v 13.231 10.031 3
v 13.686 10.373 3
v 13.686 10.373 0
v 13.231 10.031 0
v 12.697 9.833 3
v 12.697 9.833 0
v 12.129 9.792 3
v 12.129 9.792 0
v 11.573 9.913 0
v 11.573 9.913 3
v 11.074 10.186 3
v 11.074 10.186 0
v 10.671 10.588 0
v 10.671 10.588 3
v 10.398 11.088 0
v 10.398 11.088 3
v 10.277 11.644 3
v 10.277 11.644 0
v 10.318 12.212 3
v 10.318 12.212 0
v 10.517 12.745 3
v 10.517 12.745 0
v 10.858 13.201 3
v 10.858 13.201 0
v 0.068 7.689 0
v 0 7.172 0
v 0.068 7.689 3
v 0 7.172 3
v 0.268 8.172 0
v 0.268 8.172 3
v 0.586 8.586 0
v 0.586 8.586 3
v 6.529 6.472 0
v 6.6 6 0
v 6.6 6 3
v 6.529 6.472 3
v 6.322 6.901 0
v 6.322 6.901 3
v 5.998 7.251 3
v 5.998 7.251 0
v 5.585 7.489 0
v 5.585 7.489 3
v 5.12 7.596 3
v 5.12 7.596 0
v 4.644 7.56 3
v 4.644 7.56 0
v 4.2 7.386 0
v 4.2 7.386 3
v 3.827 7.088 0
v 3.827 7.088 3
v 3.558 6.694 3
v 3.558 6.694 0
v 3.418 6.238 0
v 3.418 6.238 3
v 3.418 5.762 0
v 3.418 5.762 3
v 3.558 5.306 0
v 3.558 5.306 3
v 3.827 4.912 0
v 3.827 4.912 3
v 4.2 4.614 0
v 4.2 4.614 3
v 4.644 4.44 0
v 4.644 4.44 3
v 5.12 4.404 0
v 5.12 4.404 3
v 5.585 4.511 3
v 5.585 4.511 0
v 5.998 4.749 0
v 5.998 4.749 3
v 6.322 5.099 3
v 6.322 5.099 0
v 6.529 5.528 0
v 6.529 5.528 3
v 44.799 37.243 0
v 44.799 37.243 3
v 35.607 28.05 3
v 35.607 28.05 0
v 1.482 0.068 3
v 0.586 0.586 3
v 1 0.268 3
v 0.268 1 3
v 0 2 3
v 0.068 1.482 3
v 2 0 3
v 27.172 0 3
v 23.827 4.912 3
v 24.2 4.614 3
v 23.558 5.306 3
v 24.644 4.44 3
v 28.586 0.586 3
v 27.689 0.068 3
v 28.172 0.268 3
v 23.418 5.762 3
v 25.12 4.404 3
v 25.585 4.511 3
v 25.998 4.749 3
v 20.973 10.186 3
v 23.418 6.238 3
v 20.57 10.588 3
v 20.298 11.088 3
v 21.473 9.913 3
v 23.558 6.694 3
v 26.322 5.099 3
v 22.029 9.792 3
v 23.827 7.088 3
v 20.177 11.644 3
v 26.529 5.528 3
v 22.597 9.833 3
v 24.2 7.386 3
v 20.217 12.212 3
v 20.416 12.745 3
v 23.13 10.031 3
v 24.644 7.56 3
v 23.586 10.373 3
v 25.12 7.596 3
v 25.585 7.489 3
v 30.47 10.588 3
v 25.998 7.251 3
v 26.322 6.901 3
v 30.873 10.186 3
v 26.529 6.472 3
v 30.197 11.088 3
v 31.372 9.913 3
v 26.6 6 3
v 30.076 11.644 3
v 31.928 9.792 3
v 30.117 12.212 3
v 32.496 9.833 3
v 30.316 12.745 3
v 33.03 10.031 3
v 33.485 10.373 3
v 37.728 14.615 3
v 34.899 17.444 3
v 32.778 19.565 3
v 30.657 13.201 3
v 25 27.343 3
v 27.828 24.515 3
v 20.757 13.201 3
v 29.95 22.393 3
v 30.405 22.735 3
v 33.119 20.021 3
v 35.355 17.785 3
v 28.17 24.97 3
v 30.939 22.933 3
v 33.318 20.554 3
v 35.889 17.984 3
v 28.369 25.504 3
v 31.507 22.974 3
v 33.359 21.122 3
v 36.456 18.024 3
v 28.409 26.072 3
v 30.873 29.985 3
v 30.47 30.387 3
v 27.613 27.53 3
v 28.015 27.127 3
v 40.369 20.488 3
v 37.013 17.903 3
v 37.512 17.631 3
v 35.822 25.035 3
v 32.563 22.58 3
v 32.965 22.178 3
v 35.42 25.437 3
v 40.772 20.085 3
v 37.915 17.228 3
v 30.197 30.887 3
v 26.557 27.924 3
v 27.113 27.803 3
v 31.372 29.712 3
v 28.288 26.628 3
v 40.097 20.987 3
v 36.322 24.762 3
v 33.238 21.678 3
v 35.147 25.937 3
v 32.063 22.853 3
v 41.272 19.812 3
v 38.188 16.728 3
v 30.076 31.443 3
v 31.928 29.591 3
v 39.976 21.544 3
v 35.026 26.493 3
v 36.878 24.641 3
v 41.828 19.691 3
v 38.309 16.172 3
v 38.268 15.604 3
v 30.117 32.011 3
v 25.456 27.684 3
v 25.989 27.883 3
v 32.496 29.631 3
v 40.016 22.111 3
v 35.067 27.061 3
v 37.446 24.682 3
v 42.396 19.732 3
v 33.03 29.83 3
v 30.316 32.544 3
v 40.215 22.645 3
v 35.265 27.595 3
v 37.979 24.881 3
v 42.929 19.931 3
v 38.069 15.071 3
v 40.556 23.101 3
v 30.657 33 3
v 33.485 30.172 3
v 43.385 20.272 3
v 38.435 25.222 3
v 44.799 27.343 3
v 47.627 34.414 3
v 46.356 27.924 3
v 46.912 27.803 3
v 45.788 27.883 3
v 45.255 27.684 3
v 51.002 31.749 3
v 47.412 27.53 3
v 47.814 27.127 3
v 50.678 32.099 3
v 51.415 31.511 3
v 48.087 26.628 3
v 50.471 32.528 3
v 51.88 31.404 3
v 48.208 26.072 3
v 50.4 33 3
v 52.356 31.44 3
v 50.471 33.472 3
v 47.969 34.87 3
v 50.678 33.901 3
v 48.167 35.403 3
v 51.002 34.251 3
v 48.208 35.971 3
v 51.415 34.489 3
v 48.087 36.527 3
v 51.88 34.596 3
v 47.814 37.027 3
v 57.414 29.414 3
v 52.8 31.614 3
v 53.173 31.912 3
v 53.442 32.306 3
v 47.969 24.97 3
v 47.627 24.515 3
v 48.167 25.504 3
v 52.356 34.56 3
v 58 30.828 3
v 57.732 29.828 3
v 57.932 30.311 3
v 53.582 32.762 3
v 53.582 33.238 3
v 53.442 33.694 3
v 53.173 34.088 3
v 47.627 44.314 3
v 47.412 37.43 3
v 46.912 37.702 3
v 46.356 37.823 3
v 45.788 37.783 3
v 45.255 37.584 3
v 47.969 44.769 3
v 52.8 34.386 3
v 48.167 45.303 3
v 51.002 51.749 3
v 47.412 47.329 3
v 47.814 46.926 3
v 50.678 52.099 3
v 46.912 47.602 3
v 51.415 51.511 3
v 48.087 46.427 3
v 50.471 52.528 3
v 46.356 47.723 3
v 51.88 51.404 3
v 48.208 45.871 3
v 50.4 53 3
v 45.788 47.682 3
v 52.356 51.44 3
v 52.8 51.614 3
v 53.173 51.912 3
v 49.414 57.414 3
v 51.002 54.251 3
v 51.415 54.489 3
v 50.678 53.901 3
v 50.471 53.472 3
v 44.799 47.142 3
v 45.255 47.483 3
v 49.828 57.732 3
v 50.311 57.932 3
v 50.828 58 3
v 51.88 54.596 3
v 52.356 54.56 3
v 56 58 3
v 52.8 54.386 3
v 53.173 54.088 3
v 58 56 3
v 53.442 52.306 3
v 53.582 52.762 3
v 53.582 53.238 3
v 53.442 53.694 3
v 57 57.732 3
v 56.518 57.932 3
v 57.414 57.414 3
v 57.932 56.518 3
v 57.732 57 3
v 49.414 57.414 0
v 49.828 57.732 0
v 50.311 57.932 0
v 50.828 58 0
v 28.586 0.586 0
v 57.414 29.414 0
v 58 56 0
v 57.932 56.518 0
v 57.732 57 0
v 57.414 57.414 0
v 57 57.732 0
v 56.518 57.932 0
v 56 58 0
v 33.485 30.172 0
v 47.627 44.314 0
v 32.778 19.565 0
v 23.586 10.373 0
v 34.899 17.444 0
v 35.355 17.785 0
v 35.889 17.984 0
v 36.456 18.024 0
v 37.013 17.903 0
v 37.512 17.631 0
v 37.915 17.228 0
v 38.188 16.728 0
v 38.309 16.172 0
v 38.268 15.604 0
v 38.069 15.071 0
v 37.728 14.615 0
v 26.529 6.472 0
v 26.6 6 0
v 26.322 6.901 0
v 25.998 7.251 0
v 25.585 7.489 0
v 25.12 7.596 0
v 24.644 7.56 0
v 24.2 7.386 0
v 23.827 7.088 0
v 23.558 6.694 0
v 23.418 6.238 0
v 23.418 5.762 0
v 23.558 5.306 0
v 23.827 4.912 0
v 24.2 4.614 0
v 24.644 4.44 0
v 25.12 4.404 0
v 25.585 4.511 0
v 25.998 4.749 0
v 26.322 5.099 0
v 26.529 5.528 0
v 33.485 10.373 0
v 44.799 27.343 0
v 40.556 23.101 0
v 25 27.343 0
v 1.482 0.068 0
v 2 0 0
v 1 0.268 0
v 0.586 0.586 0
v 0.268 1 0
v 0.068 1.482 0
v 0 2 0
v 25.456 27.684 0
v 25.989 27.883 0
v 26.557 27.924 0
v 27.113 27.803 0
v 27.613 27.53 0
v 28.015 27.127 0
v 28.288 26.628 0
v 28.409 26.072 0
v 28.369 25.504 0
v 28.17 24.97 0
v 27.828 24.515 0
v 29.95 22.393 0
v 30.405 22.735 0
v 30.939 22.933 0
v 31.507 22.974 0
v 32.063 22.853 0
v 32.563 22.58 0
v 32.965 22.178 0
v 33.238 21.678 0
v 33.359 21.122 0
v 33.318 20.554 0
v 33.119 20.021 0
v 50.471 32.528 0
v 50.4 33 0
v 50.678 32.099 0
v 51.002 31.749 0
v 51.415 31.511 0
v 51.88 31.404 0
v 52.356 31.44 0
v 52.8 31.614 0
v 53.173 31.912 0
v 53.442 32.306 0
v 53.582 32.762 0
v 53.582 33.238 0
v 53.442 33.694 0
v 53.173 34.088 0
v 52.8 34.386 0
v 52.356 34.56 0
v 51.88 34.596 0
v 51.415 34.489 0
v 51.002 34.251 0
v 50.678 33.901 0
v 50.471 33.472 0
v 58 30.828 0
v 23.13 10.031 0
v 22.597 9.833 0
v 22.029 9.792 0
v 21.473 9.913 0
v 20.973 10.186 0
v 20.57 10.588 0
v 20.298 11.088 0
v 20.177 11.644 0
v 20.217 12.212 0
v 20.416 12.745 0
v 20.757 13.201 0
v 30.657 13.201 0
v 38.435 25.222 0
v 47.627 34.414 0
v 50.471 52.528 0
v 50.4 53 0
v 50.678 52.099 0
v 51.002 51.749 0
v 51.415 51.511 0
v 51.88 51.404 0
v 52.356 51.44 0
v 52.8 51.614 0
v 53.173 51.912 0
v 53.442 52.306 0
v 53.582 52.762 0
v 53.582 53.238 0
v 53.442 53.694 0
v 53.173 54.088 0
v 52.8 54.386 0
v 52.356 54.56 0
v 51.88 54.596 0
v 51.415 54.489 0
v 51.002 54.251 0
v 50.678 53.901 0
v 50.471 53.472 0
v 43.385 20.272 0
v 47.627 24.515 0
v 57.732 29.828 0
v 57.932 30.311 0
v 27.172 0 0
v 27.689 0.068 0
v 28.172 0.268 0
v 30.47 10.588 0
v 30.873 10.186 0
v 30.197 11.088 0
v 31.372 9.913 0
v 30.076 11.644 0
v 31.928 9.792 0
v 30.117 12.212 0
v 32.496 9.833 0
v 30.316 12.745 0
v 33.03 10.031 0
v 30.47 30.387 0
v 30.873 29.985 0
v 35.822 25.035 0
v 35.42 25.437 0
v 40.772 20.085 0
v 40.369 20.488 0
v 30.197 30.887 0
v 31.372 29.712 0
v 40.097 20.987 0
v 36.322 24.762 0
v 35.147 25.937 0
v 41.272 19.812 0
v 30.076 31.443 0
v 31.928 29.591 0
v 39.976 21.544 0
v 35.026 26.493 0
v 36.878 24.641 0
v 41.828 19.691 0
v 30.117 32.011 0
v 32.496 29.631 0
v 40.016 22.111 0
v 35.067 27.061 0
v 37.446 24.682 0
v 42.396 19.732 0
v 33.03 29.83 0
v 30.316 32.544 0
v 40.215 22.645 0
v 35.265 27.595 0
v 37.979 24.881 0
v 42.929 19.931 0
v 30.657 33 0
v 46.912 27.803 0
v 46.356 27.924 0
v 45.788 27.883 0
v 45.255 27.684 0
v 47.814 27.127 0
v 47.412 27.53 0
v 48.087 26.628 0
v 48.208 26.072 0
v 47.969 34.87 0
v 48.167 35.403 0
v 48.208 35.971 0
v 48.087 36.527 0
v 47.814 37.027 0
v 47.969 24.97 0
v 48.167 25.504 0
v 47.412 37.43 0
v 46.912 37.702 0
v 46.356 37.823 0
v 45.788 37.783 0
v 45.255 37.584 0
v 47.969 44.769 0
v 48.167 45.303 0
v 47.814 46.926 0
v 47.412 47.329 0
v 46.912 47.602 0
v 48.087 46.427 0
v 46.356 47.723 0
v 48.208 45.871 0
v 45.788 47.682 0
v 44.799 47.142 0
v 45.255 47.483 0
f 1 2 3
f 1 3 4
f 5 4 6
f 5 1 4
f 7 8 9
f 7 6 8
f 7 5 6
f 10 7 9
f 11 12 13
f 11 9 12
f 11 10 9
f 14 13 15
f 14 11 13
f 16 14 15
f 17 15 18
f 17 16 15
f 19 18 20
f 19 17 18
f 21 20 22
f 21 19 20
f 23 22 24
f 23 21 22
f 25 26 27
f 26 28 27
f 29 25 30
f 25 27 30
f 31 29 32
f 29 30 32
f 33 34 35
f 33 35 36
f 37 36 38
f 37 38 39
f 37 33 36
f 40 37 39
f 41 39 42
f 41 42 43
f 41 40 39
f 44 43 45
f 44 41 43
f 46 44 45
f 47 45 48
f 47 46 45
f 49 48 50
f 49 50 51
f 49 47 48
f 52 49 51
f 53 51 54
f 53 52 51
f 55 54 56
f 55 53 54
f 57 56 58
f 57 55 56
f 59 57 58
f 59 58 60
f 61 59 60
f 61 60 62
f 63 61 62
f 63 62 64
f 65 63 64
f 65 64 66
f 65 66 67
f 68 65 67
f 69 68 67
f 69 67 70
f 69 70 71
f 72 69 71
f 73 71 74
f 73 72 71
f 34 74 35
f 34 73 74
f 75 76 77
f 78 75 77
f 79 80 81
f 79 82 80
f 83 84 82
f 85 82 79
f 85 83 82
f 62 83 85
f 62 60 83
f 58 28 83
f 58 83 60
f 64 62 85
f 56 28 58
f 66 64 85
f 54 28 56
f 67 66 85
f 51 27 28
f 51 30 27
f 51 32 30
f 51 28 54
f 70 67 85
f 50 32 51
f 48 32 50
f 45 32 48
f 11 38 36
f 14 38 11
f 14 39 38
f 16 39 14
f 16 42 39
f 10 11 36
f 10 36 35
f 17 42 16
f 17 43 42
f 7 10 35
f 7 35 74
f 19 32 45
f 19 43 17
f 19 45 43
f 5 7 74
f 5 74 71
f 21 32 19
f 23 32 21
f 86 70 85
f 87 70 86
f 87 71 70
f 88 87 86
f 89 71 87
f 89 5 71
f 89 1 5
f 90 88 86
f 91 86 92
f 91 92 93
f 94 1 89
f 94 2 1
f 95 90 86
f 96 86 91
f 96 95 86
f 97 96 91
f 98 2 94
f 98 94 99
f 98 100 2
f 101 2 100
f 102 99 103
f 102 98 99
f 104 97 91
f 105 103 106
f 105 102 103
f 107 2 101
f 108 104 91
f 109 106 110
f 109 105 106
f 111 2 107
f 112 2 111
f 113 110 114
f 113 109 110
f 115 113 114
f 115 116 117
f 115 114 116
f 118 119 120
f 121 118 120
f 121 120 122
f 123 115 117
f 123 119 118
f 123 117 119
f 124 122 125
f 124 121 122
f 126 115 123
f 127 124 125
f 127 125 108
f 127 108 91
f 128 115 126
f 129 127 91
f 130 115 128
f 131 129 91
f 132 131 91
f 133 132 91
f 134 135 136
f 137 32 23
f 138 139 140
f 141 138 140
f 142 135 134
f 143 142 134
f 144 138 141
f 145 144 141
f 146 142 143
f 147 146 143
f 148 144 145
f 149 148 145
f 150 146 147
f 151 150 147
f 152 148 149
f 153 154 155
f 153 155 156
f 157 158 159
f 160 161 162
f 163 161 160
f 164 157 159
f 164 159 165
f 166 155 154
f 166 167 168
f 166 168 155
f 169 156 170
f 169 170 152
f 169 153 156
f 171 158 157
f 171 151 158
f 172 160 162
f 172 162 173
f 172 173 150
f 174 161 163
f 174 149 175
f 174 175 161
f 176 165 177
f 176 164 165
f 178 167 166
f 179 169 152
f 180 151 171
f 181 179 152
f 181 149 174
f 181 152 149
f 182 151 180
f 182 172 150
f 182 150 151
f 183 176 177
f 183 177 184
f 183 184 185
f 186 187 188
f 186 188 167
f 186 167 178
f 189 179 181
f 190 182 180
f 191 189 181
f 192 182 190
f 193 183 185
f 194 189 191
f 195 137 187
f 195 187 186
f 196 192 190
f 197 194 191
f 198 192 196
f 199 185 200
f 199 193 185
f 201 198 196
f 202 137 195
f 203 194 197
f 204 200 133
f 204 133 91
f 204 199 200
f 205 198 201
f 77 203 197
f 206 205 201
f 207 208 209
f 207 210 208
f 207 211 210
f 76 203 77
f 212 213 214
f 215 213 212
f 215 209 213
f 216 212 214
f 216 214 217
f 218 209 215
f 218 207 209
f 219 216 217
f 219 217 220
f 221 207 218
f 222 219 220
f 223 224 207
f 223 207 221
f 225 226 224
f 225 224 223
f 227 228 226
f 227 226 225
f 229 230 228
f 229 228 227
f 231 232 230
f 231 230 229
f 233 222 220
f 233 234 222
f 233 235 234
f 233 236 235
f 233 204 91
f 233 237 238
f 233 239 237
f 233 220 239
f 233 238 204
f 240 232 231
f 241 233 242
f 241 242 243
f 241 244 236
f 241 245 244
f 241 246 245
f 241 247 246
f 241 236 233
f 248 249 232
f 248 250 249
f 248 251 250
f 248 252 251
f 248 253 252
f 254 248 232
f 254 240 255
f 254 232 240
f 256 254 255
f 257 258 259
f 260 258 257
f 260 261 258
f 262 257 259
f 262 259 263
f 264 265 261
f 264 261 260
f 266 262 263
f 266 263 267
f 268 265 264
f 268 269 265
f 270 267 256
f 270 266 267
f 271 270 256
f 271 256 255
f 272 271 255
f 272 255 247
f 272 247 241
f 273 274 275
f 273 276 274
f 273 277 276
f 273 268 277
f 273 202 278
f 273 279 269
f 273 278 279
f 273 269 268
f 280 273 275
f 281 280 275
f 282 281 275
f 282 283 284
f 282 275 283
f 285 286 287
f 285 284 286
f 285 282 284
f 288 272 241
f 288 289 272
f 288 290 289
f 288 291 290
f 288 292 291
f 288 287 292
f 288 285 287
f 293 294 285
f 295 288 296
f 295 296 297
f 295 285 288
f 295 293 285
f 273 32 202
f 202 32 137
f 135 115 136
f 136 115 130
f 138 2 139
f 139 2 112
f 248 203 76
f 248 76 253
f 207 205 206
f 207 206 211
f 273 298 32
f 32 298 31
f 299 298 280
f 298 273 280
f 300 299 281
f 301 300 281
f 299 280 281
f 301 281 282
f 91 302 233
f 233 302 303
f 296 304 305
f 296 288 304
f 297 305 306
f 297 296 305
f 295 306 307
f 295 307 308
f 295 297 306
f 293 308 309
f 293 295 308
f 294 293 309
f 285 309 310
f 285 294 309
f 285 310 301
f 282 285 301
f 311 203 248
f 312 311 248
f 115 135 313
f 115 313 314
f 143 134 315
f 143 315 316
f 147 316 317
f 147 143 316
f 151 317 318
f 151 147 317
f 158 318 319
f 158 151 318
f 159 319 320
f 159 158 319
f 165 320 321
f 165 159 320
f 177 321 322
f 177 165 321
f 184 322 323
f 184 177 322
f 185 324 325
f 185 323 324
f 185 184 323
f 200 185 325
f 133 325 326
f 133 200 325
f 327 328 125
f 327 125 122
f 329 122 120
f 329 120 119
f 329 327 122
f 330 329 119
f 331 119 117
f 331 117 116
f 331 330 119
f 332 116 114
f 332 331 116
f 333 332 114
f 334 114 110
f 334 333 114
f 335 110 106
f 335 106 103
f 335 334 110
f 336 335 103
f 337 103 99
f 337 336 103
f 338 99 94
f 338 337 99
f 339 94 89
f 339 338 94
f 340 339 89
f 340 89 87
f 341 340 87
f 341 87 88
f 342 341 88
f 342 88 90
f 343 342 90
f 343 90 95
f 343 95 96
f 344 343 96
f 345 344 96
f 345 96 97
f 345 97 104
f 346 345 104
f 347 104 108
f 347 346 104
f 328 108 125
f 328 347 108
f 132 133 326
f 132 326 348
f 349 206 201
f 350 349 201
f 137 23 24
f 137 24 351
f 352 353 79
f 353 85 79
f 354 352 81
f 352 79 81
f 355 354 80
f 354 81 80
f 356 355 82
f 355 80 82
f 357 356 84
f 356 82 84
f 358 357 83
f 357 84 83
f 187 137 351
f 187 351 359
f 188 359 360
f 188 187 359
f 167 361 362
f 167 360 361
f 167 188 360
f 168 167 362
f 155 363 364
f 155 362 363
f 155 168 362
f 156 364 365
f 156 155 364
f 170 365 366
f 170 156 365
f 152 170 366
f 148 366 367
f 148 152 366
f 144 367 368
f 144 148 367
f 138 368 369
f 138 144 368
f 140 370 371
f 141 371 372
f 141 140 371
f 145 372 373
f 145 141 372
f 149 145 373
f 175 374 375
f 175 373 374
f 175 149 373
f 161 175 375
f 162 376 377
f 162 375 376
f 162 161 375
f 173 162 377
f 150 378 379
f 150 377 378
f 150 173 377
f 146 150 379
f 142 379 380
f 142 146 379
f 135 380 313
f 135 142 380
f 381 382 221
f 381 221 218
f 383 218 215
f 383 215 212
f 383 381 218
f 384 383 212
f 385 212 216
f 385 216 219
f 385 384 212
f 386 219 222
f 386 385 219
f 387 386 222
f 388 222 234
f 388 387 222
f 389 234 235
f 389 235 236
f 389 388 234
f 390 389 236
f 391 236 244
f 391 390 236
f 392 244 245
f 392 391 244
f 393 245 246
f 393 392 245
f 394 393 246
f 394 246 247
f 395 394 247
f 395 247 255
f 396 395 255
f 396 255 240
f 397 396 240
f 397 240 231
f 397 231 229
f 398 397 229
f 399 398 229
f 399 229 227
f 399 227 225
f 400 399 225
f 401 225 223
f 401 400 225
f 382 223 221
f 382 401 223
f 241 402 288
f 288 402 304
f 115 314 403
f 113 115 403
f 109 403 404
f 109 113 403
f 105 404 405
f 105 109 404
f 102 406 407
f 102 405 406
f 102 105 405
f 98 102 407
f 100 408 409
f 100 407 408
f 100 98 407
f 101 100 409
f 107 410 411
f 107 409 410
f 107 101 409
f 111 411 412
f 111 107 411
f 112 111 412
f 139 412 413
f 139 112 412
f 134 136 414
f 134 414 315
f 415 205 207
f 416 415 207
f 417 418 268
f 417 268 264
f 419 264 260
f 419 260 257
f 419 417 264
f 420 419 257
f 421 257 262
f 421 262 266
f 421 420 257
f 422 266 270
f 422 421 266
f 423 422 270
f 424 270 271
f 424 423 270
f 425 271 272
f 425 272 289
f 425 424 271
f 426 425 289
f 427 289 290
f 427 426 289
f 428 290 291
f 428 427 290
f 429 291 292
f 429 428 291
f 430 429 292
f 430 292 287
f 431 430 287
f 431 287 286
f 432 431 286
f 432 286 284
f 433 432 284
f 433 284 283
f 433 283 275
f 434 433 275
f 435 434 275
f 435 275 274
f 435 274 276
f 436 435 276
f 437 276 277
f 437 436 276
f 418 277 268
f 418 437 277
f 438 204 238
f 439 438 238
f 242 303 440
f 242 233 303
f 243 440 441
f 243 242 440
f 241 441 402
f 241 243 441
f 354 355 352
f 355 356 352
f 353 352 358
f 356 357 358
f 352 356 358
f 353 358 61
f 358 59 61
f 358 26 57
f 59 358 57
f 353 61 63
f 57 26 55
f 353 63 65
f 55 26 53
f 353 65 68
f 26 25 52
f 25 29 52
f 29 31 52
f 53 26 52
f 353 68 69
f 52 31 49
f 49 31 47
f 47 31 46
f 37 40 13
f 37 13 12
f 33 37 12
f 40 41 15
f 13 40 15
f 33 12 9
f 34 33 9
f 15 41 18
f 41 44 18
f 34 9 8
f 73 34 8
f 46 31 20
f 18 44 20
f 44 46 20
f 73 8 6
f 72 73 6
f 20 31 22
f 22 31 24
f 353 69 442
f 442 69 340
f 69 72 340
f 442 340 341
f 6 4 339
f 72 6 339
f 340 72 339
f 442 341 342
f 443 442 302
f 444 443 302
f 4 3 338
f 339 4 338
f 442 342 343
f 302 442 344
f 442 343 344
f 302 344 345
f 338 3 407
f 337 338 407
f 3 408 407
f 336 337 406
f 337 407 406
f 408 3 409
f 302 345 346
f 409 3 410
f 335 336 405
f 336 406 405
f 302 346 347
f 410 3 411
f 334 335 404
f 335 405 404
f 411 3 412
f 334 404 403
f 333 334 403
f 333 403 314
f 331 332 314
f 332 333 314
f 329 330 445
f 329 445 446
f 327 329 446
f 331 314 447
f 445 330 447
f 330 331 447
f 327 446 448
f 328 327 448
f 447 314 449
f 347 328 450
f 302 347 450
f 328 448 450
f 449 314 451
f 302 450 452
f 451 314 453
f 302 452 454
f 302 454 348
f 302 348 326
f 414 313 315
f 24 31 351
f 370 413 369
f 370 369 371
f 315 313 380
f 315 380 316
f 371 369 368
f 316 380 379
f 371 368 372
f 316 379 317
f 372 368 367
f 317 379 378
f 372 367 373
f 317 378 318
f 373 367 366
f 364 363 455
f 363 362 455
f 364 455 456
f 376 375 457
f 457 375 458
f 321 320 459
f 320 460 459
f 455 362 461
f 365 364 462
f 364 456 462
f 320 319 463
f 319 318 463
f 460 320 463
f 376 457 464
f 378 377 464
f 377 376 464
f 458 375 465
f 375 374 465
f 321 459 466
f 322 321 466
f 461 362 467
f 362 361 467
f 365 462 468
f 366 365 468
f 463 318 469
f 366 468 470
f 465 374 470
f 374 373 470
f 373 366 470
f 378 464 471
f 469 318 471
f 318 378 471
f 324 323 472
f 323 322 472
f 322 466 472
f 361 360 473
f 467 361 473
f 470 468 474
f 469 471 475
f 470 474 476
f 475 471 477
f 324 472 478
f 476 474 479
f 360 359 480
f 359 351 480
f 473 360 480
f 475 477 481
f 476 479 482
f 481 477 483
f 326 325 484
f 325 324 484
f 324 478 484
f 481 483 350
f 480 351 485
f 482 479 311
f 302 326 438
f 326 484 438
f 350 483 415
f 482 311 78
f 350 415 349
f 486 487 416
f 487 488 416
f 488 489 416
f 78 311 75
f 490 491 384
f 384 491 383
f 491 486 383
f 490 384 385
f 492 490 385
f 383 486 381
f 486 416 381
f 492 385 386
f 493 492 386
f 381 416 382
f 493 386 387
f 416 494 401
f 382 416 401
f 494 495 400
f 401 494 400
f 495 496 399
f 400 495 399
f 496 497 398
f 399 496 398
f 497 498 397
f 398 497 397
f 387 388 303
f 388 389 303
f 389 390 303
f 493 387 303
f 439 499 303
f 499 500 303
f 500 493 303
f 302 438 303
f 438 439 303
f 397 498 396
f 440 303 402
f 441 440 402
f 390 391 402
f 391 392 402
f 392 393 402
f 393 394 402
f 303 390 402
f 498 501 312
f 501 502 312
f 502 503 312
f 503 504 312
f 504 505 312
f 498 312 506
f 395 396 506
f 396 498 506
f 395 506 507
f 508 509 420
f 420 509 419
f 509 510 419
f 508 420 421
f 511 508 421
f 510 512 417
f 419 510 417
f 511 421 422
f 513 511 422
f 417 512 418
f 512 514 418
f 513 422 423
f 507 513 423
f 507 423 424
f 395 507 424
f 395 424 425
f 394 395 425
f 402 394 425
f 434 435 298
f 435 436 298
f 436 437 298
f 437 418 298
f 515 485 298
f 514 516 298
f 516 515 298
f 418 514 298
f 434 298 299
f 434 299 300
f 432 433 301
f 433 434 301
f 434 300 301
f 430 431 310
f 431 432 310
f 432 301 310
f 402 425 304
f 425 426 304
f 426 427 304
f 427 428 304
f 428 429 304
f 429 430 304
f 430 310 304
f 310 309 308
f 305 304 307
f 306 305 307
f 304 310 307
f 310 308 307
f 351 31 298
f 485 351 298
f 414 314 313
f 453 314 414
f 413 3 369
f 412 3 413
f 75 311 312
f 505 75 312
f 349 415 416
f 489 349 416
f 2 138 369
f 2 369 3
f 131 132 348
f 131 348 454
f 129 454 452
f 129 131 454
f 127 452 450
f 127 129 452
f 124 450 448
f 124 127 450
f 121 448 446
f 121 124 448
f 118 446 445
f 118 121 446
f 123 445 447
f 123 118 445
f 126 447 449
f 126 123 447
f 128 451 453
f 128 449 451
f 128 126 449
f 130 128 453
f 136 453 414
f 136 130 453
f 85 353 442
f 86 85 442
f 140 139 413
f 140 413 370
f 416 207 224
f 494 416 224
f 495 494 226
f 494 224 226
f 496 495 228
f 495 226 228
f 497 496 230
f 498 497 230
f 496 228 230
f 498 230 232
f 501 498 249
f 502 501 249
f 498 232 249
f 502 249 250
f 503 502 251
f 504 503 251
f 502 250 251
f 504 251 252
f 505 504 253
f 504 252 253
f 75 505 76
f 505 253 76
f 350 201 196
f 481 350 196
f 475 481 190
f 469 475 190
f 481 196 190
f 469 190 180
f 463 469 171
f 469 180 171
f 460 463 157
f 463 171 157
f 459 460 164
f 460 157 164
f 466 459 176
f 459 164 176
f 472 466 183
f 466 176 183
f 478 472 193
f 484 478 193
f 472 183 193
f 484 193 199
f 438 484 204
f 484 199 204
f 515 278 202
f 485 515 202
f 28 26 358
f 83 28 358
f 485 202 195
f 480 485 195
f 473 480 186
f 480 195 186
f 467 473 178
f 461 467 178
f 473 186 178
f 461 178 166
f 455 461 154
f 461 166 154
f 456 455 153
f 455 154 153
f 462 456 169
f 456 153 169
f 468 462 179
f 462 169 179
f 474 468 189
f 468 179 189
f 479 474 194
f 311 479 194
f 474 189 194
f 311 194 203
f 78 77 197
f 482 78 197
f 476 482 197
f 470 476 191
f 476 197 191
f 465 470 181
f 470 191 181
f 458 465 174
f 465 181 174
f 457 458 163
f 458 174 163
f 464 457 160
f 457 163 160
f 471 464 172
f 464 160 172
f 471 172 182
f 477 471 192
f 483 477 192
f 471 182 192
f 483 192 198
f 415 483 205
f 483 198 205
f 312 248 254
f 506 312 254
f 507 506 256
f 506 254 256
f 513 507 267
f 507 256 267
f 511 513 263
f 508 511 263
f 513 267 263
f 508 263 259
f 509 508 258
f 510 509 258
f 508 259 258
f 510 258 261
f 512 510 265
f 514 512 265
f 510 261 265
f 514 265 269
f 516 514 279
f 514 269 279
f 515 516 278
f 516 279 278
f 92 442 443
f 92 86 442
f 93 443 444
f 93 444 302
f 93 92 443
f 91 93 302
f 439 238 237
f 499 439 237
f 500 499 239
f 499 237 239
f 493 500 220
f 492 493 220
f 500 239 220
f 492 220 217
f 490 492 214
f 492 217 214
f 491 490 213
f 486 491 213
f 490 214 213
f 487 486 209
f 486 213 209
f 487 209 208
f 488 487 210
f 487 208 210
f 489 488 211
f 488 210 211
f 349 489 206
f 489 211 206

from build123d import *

# Parameters (mm, degrees)
SKETCH_1_R          = 1.6
EXTRUDE_1_DEPTH     = 3
FILLET_1_R          = 2
CUT_EXTRUDE_1_DEPTH = 10


with BuildPart() as part:
    # 草图1 → 凸台-拉伸1 (new body)
    with BuildSketch(Plane.XY):
        Polygon((0, 0), (28, 0), (58, 30), (58, 58), (50, 58), (0, 8), align=None)
        with Locations((5, 6)):
            Circle(SKETCH_1_R, mode=Mode.SUBTRACT)
        with Locations((25, 6)):
            Circle(SKETCH_1_R, mode=Mode.SUBTRACT)
        with Locations(Location((52, 53, 0), (0, 0, 180))):
            Circle(SKETCH_1_R, mode=Mode.SUBTRACT)
        with Locations(Location((52, 33, 0), (0, 0, 180))):
            Circle(SKETCH_1_R, mode=Mode.SUBTRACT)
    extrude(amount=EXTRUDE_1_DEPTH)

    # 圆角1
    fillet_1_edges = [part.edges().sort_by_distance(p)[0] for p in [
        (0, 8, 1.5),
        (50, 58, 1.5),
        (58, 58, 1.5),
        (58, 30, 1.5),
        (28, 0, 1.5),
        (0, 0, 1.5),
    ]]
    fillet(fillet_1_edges, radius=FILLET_1_R)

    # 草图2 → 切除-拉伸1 (cut)
    with BuildSketch(Plane.XY.offset(3)):
        with BuildLine():
            Line((10.857864376, 13.201010127), (25, 27.343145751))
            ThreePointArc((25, 27.343145751), (27.828427125, 27.343145751), (27.828427125, 24.514718626))
            Line((27.828427125, 24.514718626), (13.686291501, 10.372583002))
            ThreePointArc((13.686291501, 10.372583002), (10.857864376, 10.372583002), (10.857864376, 13.201010127))
        make_face()
        with BuildLine():
            Line((32.778174593, 19.564971157), (23.585786438, 10.372583002))
            ThreePointArc((23.585786438, 10.372583002), (20.757359313, 10.372583002), (20.757359313, 13.201010127))
            Line((20.757359313, 13.201010127), (29.949747468, 22.393398282))
            ThreePointArc((29.949747468, 22.393398282), (32.778174593, 22.393398282), (32.778174593, 19.564971157))
        make_face()
        with BuildLine():
            Line((30.656854249, 13.201010127), (34.899494937, 17.443650814))
            ThreePointArc((34.899494937, 17.443650814), (37.727922061, 17.443650814), (37.727922061, 14.615223689))
            Line((37.727922061, 14.615223689), (33.485281374, 10.372583002))
            ThreePointArc((33.485281374, 10.372583002), (30.656854249, 10.372583002), (30.656854249, 13.201010127))
        make_face()
        with BuildLine():
            Line((44.798989873, 47.142135624), (30.656854249, 33))
            ThreePointArc((30.656854249, 33), (30.656854249, 30.171572875), (33.485281374, 30.171572875))
            Line((33.485281374, 30.171572875), (47.627416998, 44.313708499))
            ThreePointArc((47.627416998, 44.313708499), (47.627416998, 47.142135624), (44.798989873, 47.142135624))
        make_face()
        with BuildLine():
            Line((38.435028843, 25.221825407), (47.627416998, 34.414213562))
            ThreePointArc((47.627416998, 34.414213562), (47.627416998, 37.242640687), (44.798989873, 37.242640687))
            Line((44.798989873, 37.242640687), (35.606601718, 28.050252532))
            ThreePointArc((35.606601718, 28.050252532), (35.606601718, 25.221825407), (38.435028843, 25.221825407))
        make_face()
        with BuildLine():
            Line((44.798989873, 27.343145751), (40.556349186, 23.100505063))
            ThreePointArc((40.556349186, 23.100505063), (40.556349186, 20.272077939), (43.384776311, 20.272077939))
            Line((43.384776311, 20.272077939), (47.627416998, 24.514718626))
            ThreePointArc((47.627416998, 24.514718626), (47.627416998, 27.343145751), (44.798989873, 27.343145751))
        make_face()
    extrude(amount=-CUT_EXTRUDE_1_DEPTH, mode=Mode.SUBTRACT)


solid = part.part
